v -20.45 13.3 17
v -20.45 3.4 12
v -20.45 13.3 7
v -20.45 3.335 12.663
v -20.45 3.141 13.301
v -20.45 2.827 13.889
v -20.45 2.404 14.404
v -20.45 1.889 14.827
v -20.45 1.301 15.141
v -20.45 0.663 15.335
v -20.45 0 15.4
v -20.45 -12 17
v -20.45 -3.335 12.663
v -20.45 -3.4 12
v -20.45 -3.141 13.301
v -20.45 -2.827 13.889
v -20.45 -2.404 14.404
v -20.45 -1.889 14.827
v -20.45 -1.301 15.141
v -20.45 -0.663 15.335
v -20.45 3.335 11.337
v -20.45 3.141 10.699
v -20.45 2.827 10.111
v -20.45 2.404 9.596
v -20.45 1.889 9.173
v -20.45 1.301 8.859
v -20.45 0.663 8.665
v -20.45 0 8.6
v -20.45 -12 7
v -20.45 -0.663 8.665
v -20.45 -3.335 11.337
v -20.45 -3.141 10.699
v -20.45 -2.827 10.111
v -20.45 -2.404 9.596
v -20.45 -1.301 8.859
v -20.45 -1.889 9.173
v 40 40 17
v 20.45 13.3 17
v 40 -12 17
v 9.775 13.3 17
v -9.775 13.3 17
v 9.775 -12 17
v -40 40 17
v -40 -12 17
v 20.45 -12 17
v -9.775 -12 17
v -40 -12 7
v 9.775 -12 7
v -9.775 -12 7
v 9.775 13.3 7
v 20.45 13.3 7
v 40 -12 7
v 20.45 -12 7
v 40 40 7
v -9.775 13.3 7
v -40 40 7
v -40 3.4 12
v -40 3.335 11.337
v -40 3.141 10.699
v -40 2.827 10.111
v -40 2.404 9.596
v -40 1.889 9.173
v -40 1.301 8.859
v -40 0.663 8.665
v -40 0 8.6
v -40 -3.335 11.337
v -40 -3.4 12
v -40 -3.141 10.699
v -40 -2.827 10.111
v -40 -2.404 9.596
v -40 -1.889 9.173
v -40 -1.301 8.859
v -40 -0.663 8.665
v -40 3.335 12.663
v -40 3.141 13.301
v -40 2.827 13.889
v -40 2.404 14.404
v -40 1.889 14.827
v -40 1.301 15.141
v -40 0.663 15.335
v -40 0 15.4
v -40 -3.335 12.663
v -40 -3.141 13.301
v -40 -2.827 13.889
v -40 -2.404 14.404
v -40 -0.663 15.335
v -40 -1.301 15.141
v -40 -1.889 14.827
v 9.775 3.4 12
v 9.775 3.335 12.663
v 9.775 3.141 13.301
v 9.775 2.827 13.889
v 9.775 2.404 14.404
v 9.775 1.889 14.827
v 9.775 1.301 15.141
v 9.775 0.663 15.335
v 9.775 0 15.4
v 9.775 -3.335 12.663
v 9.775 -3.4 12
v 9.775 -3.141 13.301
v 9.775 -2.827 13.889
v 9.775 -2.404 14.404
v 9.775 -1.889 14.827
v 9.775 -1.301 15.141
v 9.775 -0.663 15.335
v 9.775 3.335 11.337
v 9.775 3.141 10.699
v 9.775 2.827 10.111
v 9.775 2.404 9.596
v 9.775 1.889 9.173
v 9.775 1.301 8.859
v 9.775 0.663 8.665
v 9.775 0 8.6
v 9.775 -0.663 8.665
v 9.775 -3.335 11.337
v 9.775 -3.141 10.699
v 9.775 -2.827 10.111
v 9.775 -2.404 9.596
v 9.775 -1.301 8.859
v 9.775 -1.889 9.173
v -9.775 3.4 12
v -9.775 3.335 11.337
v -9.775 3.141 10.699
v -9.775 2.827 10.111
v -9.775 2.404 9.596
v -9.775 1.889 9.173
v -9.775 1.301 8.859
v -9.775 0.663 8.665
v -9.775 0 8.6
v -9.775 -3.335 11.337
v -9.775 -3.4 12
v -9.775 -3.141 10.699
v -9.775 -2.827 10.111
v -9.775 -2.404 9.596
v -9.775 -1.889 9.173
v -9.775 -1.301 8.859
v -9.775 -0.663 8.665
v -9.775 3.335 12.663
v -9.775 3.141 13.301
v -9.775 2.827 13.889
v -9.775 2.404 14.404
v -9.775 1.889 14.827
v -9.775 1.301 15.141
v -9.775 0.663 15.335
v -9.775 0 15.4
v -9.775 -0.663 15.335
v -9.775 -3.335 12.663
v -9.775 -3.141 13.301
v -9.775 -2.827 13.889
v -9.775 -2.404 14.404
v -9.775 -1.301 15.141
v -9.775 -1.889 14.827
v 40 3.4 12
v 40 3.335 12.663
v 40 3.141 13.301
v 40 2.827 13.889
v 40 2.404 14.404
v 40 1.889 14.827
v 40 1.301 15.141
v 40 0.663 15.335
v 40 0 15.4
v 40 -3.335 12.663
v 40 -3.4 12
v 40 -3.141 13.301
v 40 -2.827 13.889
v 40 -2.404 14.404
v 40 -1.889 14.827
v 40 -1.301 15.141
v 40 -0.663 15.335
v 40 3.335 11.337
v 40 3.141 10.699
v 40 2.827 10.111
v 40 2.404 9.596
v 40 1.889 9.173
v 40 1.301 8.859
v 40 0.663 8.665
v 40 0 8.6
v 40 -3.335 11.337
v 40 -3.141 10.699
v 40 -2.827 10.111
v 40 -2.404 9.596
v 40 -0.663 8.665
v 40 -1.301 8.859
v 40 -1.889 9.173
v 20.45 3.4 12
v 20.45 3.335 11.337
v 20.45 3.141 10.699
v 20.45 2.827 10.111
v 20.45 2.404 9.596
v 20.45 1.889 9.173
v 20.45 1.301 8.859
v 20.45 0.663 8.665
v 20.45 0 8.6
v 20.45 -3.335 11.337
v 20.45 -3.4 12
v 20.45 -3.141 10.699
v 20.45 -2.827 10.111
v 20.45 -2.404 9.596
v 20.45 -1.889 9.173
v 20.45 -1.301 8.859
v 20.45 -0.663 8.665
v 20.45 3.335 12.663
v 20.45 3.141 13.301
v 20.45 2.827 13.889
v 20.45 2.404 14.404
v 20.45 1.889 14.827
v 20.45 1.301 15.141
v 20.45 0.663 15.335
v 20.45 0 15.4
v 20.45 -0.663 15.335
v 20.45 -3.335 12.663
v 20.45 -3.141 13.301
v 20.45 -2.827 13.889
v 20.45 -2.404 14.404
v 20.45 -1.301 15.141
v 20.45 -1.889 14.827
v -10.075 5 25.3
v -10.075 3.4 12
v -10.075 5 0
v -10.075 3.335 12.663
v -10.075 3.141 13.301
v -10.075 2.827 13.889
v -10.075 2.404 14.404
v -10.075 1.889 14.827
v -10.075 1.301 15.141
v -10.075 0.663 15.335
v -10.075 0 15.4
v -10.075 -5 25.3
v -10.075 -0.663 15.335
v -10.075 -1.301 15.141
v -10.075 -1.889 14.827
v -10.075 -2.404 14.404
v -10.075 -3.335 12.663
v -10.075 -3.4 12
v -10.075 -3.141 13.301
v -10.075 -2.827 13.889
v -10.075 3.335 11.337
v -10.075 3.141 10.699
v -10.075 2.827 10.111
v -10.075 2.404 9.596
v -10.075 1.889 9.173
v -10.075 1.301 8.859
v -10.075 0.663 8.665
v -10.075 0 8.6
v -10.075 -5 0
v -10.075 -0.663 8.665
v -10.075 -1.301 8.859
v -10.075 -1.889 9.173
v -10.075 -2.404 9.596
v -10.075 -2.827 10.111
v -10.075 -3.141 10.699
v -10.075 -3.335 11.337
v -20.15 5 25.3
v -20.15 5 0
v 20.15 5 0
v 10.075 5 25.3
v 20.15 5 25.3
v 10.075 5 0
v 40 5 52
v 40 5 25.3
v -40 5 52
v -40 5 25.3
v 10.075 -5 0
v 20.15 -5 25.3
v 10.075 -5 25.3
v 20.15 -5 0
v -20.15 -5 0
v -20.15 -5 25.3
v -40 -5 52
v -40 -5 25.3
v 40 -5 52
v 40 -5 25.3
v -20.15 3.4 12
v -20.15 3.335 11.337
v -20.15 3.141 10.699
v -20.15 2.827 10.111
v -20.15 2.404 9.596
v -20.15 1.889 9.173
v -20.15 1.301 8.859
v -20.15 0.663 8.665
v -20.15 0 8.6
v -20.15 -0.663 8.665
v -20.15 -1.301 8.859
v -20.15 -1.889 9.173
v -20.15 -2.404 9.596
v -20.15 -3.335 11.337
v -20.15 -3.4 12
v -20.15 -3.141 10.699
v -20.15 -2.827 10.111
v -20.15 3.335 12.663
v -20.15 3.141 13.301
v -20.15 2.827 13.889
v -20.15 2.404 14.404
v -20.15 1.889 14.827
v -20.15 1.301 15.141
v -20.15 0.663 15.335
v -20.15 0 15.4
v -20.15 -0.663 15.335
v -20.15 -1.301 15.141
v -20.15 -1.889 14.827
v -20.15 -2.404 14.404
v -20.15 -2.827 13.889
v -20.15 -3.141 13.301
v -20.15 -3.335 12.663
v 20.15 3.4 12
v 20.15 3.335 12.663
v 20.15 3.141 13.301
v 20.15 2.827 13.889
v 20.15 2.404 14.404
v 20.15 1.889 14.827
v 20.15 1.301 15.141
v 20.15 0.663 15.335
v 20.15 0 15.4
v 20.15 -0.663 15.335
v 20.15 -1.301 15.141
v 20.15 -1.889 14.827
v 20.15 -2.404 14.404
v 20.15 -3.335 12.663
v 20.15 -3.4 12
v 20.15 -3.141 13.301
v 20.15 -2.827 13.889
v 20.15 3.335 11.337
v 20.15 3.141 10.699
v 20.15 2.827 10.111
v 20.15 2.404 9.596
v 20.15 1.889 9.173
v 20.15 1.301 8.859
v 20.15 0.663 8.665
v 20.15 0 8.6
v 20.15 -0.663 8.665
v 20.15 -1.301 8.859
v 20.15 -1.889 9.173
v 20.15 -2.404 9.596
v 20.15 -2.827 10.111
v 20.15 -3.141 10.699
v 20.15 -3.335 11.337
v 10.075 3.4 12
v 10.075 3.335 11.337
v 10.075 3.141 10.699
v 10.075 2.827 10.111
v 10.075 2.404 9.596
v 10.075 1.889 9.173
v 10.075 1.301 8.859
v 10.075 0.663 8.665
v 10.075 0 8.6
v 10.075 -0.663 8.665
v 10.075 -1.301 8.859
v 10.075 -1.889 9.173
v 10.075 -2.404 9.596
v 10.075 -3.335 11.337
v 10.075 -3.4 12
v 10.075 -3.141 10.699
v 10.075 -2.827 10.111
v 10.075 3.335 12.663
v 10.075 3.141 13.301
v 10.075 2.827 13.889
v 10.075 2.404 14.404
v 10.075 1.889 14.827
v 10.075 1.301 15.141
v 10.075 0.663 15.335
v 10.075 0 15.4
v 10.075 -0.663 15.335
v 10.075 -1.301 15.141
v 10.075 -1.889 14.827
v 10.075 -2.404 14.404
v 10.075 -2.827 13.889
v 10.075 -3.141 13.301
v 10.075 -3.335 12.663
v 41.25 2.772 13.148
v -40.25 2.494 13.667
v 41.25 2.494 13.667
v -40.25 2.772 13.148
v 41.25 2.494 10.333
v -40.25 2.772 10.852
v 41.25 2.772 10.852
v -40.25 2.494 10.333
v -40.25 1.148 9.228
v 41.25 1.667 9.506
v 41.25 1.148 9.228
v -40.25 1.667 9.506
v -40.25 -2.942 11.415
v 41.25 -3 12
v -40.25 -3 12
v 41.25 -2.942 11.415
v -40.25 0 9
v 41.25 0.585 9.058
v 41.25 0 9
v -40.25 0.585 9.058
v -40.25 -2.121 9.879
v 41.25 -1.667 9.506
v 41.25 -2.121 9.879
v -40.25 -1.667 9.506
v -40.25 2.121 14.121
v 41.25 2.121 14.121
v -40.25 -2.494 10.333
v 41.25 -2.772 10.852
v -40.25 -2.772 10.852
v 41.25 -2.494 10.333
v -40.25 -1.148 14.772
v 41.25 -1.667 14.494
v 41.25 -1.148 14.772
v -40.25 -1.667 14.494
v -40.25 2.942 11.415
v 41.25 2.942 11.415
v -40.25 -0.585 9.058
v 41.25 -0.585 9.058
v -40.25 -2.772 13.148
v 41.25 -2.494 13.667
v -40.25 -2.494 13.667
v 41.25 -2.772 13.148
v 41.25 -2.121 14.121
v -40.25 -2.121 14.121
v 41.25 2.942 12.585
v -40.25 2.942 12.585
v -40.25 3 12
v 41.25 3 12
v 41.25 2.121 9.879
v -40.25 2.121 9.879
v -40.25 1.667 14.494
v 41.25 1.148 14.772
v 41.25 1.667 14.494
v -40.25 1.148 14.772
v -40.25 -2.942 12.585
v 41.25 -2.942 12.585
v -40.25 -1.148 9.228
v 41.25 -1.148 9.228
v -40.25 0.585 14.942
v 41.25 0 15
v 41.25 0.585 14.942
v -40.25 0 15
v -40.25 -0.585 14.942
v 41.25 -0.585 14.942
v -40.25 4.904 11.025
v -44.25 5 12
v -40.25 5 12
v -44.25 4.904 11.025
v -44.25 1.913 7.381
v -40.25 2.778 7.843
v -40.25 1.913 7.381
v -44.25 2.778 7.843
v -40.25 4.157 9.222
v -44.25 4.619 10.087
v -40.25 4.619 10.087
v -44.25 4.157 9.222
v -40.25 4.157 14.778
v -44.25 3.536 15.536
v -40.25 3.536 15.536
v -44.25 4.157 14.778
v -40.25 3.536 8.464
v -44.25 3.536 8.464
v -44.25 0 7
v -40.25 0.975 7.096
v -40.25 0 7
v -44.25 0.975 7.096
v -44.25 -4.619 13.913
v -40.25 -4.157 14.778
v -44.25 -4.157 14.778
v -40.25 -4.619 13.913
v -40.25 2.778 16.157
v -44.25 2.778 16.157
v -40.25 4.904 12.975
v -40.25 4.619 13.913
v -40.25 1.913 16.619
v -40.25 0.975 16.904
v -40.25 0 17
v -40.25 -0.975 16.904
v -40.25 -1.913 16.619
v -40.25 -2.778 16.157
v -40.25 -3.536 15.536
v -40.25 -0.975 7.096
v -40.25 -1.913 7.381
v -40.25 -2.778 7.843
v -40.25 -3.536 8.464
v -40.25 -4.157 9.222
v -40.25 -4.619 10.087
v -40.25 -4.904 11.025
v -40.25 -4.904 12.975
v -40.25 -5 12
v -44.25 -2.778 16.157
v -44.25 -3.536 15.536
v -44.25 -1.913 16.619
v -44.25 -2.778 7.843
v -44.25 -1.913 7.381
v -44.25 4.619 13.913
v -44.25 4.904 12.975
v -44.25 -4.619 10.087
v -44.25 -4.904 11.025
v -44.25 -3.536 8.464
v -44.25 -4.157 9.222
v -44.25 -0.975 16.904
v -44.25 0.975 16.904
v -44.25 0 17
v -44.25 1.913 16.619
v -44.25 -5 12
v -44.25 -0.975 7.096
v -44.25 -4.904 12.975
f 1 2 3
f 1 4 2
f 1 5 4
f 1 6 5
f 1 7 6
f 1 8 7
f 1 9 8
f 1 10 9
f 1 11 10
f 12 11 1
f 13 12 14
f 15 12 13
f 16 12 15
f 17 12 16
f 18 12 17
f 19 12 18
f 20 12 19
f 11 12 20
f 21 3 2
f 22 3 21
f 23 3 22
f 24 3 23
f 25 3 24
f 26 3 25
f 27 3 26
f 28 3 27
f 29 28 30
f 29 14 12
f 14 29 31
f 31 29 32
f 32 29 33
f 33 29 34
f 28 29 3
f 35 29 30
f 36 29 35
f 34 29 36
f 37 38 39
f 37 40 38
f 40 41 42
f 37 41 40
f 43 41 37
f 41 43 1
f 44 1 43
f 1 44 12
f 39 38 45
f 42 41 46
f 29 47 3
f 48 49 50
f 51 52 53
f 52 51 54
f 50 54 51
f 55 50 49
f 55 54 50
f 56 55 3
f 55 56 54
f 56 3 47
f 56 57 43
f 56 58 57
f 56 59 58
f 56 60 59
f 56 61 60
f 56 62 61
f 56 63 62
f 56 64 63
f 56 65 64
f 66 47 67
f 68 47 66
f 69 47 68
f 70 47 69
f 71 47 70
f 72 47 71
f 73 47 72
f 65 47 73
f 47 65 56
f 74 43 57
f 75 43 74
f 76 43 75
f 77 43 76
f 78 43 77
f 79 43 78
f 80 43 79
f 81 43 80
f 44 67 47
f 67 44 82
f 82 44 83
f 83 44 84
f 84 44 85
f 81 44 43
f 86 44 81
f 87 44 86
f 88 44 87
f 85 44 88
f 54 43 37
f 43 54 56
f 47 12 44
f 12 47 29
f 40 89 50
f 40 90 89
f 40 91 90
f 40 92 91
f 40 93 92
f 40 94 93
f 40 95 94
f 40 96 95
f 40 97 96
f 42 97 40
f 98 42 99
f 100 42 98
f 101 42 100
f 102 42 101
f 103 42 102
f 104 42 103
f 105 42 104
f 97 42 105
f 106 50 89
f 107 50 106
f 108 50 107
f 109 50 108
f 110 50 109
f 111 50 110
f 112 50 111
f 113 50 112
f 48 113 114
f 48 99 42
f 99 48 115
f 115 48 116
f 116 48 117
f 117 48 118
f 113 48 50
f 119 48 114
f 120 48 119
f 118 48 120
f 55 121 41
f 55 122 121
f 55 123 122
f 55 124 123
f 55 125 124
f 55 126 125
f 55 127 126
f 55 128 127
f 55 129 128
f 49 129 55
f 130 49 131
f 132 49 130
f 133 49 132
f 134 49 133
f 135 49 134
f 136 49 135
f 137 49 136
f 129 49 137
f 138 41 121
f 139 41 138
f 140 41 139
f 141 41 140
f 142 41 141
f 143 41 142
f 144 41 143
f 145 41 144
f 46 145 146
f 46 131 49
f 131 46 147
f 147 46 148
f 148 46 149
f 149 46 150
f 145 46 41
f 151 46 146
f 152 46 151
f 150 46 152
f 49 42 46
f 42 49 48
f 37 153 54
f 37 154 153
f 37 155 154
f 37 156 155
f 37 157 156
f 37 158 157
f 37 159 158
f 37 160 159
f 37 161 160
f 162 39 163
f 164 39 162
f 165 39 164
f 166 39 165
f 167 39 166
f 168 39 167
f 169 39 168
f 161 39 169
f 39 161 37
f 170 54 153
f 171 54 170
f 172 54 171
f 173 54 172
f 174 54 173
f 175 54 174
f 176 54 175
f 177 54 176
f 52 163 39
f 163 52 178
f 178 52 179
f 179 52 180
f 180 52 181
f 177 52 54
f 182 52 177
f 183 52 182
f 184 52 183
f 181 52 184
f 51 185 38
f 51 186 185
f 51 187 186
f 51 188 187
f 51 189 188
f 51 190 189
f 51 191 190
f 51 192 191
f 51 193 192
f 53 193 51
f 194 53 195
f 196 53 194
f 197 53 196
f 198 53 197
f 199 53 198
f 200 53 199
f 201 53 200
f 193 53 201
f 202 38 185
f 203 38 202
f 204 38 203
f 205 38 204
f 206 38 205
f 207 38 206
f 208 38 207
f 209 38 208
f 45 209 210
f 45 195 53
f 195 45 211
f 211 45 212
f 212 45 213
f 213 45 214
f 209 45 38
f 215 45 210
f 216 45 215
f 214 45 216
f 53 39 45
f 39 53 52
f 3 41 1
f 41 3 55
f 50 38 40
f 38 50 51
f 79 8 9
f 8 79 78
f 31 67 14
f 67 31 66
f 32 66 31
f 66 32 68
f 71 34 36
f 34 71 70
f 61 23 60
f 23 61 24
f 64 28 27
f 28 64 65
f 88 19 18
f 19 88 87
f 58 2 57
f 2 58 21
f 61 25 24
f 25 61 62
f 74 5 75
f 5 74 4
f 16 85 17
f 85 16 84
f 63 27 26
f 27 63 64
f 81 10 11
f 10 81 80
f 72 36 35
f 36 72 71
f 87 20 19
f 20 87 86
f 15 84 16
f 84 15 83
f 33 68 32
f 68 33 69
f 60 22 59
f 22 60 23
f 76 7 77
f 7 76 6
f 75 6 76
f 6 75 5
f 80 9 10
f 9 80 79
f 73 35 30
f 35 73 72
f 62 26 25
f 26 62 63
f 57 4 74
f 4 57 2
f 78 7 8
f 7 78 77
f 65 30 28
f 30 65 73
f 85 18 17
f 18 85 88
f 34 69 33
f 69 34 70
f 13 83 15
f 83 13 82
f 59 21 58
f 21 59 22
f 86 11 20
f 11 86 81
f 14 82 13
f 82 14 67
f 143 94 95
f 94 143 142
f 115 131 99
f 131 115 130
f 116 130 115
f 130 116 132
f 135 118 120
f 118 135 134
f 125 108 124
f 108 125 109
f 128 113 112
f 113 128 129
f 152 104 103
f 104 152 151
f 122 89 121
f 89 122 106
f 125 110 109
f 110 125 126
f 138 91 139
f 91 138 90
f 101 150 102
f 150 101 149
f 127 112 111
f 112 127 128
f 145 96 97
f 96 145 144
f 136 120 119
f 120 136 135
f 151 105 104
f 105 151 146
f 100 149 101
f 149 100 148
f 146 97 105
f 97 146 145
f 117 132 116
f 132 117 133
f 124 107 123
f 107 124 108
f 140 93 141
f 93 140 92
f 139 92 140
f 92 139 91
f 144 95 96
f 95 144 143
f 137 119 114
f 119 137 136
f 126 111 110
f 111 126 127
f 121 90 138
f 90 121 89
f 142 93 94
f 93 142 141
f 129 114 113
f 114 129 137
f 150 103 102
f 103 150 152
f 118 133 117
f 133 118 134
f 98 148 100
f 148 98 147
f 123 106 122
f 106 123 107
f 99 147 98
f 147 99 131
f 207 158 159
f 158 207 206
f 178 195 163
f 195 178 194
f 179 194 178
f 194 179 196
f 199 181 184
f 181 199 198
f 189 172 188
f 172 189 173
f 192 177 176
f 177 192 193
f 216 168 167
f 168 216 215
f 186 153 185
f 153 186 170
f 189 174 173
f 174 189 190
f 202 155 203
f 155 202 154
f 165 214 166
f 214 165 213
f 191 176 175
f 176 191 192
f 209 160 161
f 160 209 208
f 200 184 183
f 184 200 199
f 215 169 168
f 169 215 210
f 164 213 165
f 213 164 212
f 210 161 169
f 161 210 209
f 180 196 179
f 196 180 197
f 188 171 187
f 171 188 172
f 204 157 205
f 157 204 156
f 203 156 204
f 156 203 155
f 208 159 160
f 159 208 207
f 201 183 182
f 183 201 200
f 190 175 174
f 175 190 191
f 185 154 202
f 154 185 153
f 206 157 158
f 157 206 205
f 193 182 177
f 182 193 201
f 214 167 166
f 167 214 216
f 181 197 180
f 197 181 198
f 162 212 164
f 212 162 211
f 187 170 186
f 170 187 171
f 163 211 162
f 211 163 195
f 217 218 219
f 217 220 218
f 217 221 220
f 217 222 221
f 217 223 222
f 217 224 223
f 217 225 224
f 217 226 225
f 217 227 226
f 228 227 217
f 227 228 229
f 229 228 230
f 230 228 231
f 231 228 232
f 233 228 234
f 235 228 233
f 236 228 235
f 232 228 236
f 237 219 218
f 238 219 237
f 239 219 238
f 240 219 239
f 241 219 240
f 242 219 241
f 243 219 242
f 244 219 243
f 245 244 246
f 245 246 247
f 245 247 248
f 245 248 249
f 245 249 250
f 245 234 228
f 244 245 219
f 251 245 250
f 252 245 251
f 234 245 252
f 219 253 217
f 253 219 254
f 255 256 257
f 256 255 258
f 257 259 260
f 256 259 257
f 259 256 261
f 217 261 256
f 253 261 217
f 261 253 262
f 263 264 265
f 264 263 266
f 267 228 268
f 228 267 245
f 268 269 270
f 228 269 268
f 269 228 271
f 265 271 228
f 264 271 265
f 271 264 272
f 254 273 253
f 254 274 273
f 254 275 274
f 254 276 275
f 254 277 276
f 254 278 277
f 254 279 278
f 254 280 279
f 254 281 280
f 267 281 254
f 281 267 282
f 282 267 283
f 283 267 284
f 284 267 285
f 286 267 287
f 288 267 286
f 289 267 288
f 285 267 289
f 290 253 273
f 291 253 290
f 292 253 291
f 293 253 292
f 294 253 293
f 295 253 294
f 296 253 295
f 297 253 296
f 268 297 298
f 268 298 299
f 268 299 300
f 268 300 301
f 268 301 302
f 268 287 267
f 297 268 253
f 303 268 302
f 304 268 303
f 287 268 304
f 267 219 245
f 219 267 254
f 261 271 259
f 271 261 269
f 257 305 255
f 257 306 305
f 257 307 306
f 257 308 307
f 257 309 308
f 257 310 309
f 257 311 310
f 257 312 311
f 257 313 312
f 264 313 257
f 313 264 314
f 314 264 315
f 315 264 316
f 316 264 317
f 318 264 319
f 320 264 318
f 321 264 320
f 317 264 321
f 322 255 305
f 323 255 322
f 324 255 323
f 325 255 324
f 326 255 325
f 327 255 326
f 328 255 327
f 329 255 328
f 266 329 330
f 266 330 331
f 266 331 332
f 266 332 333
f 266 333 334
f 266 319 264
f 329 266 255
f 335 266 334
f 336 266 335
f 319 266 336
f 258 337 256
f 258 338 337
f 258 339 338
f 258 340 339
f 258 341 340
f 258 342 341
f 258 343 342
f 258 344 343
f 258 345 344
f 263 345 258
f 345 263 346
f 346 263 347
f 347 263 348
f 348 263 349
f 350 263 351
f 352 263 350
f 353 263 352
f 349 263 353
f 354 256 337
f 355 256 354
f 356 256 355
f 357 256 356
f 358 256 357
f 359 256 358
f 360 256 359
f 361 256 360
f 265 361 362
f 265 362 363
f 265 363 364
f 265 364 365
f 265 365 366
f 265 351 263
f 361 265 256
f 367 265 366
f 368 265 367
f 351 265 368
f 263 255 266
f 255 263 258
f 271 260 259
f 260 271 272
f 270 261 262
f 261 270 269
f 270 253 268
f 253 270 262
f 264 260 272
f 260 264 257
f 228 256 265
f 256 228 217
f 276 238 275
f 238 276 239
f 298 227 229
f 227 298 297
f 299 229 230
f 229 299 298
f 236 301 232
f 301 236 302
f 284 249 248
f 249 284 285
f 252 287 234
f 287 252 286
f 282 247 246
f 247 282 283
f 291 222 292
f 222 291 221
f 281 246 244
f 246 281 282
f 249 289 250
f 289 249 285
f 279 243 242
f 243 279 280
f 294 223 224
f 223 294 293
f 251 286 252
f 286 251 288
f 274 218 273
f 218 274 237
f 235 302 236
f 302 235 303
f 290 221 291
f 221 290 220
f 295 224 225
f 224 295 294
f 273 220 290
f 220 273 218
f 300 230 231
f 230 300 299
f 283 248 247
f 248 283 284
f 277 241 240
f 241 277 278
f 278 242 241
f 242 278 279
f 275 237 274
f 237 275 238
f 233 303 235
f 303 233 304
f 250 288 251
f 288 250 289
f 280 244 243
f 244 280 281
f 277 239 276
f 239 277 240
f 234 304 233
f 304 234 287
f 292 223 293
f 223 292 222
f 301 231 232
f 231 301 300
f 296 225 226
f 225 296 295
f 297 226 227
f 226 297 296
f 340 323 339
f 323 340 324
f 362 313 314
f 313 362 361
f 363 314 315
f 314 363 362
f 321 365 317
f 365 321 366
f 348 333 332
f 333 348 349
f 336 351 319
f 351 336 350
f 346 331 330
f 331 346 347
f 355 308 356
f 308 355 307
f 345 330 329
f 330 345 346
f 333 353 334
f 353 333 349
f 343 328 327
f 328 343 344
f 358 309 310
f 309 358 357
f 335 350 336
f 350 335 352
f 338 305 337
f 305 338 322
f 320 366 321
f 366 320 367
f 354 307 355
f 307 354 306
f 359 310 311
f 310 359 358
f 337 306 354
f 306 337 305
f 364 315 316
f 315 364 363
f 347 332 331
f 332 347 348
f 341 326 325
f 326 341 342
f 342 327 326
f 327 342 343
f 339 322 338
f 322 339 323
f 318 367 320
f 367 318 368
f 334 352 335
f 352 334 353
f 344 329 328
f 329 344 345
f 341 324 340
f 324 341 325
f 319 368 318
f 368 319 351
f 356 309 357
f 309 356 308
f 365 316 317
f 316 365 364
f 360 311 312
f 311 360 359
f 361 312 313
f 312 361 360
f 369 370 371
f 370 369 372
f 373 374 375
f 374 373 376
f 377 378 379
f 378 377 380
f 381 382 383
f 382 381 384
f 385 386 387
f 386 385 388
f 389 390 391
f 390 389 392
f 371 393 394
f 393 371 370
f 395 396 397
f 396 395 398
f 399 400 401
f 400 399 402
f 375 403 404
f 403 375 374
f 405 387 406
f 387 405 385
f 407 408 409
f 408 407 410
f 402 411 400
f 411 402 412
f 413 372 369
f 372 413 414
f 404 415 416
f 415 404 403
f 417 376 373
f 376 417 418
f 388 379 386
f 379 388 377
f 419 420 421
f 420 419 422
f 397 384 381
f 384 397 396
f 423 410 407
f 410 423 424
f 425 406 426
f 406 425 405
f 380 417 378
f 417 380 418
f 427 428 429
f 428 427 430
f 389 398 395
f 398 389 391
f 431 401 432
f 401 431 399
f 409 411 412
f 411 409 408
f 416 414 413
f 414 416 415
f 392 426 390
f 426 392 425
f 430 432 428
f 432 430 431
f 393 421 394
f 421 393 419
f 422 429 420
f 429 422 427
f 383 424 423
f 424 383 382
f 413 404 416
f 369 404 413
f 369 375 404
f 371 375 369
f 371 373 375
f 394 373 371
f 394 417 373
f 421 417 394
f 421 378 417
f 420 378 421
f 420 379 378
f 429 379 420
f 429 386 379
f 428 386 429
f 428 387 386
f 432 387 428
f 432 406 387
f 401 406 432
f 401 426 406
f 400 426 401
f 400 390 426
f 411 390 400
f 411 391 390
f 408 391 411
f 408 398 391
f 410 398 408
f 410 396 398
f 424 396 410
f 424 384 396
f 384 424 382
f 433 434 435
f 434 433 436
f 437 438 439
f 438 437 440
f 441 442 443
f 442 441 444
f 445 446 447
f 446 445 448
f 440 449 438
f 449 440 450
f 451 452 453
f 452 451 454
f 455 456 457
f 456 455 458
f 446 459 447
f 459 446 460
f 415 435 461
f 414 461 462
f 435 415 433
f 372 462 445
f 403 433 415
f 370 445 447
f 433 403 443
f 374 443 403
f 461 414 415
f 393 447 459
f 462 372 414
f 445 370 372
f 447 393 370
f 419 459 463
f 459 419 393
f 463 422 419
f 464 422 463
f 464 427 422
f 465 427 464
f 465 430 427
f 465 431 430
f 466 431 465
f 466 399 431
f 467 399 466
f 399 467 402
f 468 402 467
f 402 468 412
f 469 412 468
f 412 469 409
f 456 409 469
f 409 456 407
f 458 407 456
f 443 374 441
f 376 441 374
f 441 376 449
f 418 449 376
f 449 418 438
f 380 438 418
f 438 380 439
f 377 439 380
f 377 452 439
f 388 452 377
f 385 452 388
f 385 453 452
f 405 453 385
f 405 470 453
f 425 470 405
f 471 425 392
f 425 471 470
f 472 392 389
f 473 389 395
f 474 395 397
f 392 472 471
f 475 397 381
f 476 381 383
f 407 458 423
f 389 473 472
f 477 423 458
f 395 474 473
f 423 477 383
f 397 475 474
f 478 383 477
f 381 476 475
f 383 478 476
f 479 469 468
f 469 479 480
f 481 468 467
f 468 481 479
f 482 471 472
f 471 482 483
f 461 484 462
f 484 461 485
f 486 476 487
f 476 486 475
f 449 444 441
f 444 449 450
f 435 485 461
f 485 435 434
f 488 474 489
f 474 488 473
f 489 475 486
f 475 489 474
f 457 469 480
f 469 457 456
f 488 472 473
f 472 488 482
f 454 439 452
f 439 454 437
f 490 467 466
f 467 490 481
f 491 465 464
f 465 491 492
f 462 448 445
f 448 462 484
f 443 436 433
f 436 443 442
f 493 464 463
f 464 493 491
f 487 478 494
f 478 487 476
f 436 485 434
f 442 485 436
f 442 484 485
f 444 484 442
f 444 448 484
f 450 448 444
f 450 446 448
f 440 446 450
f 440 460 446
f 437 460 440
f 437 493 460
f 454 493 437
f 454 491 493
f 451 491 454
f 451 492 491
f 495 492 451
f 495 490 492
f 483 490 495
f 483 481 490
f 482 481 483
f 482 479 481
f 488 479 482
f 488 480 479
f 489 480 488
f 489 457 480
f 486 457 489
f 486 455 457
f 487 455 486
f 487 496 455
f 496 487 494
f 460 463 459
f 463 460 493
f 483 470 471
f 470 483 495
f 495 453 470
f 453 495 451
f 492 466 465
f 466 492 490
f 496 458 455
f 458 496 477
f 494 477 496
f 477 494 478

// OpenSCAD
$fn = 32;

// ------------------------------------------------------------------------
// Butt hinge: hinge 80 mm, leaf swung 270 deg
// Every part is its own module, assembly() places every instance.
// ------------------------------------------------------------------------

// --- part 1 ---
module hinge_base() {
  difference() {
    union() {
      translate([-40, -12, -5]) cube([19.55, 52, 10]);
      translate([-9.775, -12, -5]) cube([19.55, 52, 10]);
      translate([20.45, -12, -5]) cube([19.55, 52, 10]);
      translate([-40, 13.3, -5]) cube([80, 26.7, 10]);
    }
    translate([-30.225, 0, 0]) rotate([0, 90, 0]) cylinder(h = 21.55, d = 6.8, center = true);
    translate([0, 0, 0]) rotate([0, 90, 0]) cylinder(h = 21.55, d = 6.8, center = true);
    translate([30.225, 0, 0]) rotate([0, 90, 0]) cylinder(h = 21.55, d = 6.8, center = true);
  }
}

// --- part 2 ---
module hinge_mover() {
  difference() {
    union() {
      translate([-20.15, -40, -5]) cube([10.075, 52, 10]);
      translate([10.075, -40, -5]) cube([10.075, 52, 10]);
      translate([-40, -40, -5]) cube([80, 26.7, 10]);
    }
    translate([-15.113, 0, 0]) rotate([0, 90, 0]) cylinder(h = 12.075, d = 6.8, center = true);
    translate([15.113, 0, 0]) rotate([0, 90, 0]) cylinder(h = 12.075, d = 6.8, center = true);
  }
}

// --- part 3 ---
module hinge_pin() {
  rotate([0, 90, 0]) cylinder(h = 82.5, d = 6, center = true);
  translate([-44.25, 0, 0]) rotate([0, 90, 0]) cylinder(h = 4, d = 10);
}

// --- assembly ---
module assembly() {
  color([0.80, 0.24, 0.20]) translate([0, 0, 12]) rotate([0, 0, 0]) hinge_base();
  color([0.20, 0.45, 0.75]) translate([0, 0, 12]) rotate([270, 0, 0]) hinge_mover();
  color([0.25, 0.62, 0.32]) translate([0, 0, 12]) rotate([0, 0, 0]) hinge_pin();
}

assembly();
